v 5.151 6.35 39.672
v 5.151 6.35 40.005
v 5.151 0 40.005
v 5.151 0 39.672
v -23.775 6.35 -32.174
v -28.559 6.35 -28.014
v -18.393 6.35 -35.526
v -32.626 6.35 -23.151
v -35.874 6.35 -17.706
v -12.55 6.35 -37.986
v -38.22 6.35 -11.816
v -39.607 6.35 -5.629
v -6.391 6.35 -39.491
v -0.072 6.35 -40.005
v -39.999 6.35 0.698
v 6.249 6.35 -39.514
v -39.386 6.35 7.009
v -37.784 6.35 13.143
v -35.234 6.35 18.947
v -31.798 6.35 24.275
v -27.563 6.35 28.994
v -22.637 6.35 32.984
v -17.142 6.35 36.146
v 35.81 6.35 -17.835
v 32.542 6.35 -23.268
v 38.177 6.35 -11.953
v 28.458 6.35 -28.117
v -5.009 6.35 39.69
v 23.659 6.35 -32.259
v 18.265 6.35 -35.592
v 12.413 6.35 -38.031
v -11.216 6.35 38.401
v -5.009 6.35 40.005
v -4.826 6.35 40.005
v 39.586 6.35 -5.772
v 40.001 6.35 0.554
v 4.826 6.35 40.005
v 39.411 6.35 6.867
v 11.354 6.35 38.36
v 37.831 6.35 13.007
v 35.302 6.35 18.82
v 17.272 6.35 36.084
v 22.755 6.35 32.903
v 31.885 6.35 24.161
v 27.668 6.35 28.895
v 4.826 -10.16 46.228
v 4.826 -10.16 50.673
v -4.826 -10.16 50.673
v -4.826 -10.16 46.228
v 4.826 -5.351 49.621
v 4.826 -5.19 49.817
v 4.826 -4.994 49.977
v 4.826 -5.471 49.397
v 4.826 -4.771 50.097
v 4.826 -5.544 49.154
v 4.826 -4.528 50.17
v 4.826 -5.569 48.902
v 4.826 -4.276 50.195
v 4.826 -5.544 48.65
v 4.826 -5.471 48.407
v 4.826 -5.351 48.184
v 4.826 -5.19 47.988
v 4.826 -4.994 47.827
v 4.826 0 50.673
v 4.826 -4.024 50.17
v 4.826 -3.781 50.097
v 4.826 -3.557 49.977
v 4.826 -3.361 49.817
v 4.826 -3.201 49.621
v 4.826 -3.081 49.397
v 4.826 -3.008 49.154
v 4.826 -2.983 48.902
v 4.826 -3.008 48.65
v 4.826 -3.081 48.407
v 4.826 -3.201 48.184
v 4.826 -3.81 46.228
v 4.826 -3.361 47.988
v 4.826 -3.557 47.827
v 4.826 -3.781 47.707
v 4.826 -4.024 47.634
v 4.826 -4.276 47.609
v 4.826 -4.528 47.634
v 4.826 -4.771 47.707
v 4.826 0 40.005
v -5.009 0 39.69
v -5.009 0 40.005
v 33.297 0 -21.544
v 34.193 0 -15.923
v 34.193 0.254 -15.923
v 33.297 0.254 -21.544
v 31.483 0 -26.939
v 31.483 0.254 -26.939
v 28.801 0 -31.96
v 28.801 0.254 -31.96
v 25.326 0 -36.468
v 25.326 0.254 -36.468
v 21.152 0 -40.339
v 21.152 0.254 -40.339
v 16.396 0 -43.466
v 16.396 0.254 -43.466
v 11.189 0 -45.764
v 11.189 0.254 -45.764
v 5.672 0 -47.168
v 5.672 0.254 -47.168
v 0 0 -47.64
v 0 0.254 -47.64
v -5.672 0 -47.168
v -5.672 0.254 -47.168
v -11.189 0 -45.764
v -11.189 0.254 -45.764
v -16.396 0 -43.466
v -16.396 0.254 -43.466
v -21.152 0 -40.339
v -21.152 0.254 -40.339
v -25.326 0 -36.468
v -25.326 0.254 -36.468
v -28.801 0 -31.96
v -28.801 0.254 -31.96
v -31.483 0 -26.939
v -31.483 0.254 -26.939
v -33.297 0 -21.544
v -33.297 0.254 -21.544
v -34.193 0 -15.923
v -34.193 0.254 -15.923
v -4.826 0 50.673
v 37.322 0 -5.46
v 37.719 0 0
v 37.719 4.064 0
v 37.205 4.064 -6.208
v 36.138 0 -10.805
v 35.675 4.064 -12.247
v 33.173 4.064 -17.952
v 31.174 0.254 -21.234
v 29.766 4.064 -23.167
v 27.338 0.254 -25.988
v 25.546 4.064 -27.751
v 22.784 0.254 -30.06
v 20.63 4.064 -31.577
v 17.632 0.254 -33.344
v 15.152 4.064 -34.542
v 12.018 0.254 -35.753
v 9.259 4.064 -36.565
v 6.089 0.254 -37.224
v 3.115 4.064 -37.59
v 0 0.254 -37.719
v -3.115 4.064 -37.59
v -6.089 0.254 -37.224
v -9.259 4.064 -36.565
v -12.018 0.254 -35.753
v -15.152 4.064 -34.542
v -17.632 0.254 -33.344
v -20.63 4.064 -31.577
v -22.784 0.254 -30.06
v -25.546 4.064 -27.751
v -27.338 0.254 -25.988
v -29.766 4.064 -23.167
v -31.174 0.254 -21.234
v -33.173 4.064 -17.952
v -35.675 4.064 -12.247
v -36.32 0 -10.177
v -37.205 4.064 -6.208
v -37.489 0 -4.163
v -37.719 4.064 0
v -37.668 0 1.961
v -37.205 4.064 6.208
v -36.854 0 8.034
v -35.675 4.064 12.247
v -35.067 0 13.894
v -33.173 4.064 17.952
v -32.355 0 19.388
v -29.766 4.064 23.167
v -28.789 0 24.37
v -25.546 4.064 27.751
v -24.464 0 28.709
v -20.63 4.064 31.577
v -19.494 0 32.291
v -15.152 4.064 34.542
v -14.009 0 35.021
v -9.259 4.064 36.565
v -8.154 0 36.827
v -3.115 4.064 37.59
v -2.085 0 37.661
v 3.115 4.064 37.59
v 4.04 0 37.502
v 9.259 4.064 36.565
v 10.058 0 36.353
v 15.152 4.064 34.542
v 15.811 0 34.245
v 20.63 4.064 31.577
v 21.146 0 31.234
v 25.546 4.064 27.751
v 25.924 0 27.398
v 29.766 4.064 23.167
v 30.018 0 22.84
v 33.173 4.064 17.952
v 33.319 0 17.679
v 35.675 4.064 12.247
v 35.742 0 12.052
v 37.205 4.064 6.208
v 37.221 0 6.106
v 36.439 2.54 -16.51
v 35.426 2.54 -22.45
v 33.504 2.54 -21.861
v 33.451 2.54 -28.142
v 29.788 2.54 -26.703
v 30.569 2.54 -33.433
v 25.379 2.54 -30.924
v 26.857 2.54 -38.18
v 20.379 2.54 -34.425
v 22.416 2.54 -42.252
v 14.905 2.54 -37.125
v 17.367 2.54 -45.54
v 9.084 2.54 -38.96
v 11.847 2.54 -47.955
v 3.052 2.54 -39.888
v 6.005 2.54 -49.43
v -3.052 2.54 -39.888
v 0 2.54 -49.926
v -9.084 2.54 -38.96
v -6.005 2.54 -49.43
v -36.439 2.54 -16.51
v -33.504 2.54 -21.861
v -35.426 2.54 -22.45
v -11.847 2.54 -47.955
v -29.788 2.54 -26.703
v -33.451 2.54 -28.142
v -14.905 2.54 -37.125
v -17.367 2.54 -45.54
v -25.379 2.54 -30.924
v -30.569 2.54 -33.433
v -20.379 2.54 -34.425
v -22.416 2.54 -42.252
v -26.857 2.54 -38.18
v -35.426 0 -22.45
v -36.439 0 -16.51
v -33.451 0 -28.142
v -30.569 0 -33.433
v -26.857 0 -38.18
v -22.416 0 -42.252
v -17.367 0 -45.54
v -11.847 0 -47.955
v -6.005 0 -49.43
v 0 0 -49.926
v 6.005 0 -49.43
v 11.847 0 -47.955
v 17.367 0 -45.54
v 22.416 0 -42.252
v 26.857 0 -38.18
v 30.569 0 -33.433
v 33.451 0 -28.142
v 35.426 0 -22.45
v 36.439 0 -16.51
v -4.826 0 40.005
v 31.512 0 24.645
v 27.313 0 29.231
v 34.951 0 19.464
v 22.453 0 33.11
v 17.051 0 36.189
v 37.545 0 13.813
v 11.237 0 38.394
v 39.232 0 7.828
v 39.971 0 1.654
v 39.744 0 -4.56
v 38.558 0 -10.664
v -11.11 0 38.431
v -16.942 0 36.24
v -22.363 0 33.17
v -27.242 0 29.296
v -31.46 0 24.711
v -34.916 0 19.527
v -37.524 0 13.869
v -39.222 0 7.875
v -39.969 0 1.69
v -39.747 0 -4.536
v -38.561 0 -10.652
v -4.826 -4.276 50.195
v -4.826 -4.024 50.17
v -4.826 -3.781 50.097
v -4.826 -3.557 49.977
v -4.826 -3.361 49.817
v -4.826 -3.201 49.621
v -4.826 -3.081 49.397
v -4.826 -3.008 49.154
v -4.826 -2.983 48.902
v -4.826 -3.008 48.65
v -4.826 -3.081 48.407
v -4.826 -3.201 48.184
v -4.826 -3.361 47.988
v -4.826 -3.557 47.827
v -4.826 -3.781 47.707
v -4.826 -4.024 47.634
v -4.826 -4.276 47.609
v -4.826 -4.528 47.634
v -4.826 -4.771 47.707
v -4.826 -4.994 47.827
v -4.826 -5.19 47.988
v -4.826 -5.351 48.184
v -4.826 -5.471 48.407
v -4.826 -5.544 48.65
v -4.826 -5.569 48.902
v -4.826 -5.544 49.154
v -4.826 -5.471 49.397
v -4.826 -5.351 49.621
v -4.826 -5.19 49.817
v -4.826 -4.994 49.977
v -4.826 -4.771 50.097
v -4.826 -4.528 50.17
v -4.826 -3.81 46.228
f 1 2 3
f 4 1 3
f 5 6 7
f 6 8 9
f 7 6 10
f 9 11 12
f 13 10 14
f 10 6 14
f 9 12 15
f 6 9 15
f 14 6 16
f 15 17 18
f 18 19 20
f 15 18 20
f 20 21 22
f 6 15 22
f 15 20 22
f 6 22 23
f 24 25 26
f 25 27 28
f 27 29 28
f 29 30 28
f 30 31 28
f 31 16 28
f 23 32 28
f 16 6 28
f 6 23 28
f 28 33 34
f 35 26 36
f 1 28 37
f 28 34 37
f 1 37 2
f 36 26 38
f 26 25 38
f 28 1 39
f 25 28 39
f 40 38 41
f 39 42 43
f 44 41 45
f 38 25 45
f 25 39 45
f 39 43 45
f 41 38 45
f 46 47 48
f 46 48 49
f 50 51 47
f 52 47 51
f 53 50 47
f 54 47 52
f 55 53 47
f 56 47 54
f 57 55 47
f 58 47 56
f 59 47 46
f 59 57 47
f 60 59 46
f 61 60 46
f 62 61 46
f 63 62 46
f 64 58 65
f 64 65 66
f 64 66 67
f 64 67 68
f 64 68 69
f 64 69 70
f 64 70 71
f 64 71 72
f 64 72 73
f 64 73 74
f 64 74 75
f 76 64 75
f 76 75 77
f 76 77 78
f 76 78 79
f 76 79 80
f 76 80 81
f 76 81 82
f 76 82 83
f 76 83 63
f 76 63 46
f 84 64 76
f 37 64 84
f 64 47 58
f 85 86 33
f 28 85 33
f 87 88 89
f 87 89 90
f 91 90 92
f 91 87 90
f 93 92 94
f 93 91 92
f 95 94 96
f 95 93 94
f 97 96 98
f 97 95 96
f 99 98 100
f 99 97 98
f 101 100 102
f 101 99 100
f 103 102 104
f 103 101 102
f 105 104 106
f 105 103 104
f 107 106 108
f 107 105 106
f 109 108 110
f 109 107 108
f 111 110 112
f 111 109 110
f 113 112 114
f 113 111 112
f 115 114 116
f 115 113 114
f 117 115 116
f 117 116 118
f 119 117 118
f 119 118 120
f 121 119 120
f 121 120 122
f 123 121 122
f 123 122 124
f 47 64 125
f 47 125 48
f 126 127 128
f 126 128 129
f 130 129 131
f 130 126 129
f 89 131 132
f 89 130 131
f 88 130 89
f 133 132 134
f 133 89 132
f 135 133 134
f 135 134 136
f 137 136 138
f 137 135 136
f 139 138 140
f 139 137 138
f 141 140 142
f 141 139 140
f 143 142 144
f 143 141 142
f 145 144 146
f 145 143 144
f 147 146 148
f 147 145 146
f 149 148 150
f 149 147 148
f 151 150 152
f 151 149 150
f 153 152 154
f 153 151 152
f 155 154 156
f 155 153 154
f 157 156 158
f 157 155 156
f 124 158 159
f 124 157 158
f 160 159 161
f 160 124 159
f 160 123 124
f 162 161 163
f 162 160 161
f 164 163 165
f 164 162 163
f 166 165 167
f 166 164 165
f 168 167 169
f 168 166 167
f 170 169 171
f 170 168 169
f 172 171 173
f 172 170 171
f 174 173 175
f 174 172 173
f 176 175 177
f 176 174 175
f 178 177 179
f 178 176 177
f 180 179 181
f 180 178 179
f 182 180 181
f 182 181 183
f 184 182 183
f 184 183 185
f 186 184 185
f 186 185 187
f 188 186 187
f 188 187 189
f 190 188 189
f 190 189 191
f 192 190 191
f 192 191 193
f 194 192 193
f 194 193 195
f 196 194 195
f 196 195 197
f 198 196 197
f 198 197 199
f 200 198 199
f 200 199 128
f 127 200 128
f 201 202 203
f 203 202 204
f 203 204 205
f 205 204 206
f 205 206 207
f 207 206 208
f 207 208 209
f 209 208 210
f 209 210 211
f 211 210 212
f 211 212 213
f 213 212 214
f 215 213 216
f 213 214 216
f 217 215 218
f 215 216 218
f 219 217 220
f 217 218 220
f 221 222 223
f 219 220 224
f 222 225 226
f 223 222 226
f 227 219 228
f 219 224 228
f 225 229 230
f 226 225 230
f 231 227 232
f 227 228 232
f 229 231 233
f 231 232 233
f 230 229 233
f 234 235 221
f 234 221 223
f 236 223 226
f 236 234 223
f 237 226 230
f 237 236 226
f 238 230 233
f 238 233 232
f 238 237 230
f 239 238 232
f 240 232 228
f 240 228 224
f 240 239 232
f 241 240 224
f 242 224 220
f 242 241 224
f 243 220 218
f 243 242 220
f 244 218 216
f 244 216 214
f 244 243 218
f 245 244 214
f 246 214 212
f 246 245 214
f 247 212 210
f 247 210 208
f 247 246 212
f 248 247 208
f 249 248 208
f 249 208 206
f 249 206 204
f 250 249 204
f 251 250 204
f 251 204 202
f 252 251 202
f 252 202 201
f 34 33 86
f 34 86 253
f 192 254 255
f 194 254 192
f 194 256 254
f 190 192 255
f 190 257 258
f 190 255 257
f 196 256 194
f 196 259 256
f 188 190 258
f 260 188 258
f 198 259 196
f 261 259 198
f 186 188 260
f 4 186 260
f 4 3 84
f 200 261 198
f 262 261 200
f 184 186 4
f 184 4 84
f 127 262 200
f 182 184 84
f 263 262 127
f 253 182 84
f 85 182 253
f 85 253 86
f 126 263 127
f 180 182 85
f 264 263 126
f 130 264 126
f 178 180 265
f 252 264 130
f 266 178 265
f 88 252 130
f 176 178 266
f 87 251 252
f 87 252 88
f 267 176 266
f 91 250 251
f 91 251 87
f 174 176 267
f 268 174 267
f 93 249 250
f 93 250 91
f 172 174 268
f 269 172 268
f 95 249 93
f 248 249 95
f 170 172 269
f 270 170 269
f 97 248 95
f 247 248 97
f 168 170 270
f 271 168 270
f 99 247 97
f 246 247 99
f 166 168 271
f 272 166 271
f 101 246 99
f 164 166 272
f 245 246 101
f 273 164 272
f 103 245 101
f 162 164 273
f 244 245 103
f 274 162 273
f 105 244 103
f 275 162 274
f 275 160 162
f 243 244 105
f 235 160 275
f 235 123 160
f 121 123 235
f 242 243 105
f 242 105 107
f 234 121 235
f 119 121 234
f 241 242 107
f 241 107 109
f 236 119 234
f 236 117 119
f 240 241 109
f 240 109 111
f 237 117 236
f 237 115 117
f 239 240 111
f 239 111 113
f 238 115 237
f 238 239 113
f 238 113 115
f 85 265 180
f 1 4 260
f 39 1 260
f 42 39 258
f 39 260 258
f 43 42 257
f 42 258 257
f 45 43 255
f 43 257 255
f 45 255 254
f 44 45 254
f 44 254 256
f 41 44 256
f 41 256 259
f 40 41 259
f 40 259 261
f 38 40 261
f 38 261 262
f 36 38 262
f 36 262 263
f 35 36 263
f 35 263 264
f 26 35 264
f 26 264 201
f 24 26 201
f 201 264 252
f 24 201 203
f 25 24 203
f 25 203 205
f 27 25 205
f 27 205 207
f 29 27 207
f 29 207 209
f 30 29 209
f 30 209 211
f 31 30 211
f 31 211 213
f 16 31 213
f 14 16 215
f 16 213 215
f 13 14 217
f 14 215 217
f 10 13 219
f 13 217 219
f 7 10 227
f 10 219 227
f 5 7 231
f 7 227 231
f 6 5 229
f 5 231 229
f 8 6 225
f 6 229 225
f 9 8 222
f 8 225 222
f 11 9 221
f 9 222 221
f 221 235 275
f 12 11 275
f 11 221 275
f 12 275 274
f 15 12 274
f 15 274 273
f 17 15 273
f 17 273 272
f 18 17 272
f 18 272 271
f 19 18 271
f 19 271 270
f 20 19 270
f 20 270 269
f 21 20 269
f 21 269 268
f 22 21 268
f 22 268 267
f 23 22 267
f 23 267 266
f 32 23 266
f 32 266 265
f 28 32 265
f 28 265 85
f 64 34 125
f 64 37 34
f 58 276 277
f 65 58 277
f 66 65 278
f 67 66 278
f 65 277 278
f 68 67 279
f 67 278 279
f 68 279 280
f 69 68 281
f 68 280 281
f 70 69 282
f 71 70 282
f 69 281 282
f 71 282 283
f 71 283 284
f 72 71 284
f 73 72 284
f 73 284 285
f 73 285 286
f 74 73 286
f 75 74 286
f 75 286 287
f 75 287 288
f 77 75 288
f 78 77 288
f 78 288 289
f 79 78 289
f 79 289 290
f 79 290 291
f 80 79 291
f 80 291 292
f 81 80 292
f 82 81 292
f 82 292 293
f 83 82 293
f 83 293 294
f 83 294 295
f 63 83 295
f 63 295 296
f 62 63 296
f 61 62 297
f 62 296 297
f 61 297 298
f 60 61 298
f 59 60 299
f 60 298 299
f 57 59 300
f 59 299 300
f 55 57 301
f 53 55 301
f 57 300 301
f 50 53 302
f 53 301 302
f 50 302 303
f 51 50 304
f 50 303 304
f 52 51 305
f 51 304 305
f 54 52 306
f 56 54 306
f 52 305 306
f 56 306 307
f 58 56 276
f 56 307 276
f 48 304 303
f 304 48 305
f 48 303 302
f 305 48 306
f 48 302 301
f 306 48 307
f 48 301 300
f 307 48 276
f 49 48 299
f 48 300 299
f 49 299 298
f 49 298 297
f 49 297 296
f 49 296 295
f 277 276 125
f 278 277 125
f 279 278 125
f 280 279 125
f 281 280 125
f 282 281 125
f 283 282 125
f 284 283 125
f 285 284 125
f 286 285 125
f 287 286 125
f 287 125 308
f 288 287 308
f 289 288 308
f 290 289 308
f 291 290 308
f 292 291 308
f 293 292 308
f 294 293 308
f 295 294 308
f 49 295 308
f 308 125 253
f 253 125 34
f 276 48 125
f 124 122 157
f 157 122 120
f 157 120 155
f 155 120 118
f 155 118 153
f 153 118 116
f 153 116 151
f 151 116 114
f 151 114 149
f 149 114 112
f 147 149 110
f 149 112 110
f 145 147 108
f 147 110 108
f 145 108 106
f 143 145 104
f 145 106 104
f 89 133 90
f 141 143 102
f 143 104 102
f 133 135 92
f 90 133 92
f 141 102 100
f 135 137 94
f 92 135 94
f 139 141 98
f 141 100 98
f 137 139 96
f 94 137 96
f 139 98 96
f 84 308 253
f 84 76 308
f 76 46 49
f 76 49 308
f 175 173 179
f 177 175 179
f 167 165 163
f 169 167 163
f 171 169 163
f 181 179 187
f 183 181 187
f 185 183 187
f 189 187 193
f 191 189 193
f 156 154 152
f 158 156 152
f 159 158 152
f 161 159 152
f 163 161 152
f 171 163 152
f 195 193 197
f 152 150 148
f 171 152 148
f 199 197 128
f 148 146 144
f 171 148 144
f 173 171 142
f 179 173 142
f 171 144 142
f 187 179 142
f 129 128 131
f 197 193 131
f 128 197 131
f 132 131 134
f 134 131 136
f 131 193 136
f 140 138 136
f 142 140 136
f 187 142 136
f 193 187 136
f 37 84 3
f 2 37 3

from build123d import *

# Parameters (mm, degrees)
SKETCH1_R           = 40.005
BOSS_EXTRUDE1_DEPTH = 6.35
BOSS_EXTRUDE2_DEPTH = 2.54
SHELL2_OUTLINE_R    = 37.719
SHELL2_DEPTH        = 4.064
SHELL2_2_DEPTH      = 0.254
BOSS_EXTRUDE3_DEPTH = 4.826
CUT_EXTRUDE1_REACH  = 70.416
SKETCH10_R          = 1.293229199


# Read off the part's stored shape, not the designer's step: Shell2
with BuildPart() as part:
    # Sketch1 → Boss-Extrude1 (new body)
    with BuildSketch(Plane(origin=(0, 0, 0), x_dir=(1, 0, 0), z_dir=(0, 1, 0))):
        with Locations(Location((0, 0, 0), (0, 0, 270))):
            Circle(SKETCH1_R)
    extrude(amount=BOSS_EXTRUDE1_DEPTH)

    # Sketch2 → Boss-Extrude2 (add)
    with BuildSketch(Plane(origin=(0, 0, 0), x_dir=(1, 0, 0), z_dir=(0, 1, 0))):
        with BuildLine():
            ThreePointArc((-36.439263508, 16.51), (0, 49.926276753), (36.439263508, 16.51))
            ThreePointArc((36.439263508, 16.51), (0, -40.005), (-36.439263508, 16.51))
        make_face()
    extrude(amount=BOSS_EXTRUDE2_DEPTH)

    # Shell2 outline → Shell2 (cut)
    with BuildSketch(Plane(origin=(0, 0, 0), x_dir=(1, 0, 0), z_dir=(0, 1, 0))):
        Circle(SHELL2_OUTLINE_R)
    extrude(amount=SHELL2_DEPTH, mode=Mode.SUBTRACT)

    # Shell2 2 outline → Shell2 2 (cut)
    with BuildSketch(Plane(origin=(0, 0, 0), x_dir=(1, 0, 0), z_dir=(0, 1, 0))):
        with BuildLine():
            ThreePointArc((-34.19336189, 15.922844082), (0, 37.719), (34.19336189, 15.922844082))
            ThreePointArc((34.19336189, 15.922844082), (0, 47.640276753), (-34.19336189, 15.922844082))
        make_face()
    extrude(amount=SHELL2_2_DEPTH, mode=Mode.SUBTRACT)



with BuildPart() as body_2:
    # Sketch6 → Boss-Extrude3 (new, symmetric)
    with BuildSketch(Plane(origin=(0, 0, 0), x_dir=(0, 0, -1), z_dir=(1, 0, 0))):
        Polygon((-40.005, 6.35), (-50.673, 0), (-50.673, -10.16), (-46.228, -10.16), (-46.228, -3.81), (-40.005, 0), align=None)
    extrude(amount=BOSS_EXTRUDE3_DEPTH, both=True)


with BuildPart() as part_1:
    add(part.part)

    add(body_2.part)  # Loft1 merges body 2
    # Sketch9 → Loft1 section 0
    with BuildSketch(Plane.XY.offset(38.1)):
        with BuildLine():
            Line((-5.008565366, 6.35), (5.151434634, 6.35))
            Line((5.151434634, 6.35), (5.151434634, 0))
            Line((5.151434634, 0), (-5.008565366, 0))
            Line((-5.008565366, 0), (-5.008565366, 6.35))
        make_face()
    # Sketch7 → Loft1 section 1
    with BuildSketch(Plane(origin=(0, 0, 40.005), x_dir=(-1, 0, 0), z_dir=(0, 0, -1))):
        with BuildLine():
            Line((-5.151434634, 0), (5.008565366, 0))
            Line((5.008565366, 0), (5.008565366, 6.35))
            Line((5.008565366, 6.35), (-5.151434634, 6.35))
            Line((-5.151434634, 6.35), (-5.151434634, 0))
        make_face()
    loft()

    # Sketch10 → Cut-Extrude1 (cut, up to next)
    with BuildSketch(Plane.ZY.offset(4.826), mode=Mode.PRIVATE) as cut_extrude1_sk1:
        with Locations((48.902107894, -4.275925595)):
            Circle(SKETCH10_R)
    cut_extrude1_tool1 = extrude(cut_extrude1_sk1.sketch, amount=-CUT_EXTRUDE1_REACH, mode=Mode.PRIVATE) & part_1.part
    add(cut_extrude1_tool1.solids().sort_by_distance((-4.826, -4.275926, 48.902108))[0], mode=Mode.SUBTRACT)


solid = part_1.part
